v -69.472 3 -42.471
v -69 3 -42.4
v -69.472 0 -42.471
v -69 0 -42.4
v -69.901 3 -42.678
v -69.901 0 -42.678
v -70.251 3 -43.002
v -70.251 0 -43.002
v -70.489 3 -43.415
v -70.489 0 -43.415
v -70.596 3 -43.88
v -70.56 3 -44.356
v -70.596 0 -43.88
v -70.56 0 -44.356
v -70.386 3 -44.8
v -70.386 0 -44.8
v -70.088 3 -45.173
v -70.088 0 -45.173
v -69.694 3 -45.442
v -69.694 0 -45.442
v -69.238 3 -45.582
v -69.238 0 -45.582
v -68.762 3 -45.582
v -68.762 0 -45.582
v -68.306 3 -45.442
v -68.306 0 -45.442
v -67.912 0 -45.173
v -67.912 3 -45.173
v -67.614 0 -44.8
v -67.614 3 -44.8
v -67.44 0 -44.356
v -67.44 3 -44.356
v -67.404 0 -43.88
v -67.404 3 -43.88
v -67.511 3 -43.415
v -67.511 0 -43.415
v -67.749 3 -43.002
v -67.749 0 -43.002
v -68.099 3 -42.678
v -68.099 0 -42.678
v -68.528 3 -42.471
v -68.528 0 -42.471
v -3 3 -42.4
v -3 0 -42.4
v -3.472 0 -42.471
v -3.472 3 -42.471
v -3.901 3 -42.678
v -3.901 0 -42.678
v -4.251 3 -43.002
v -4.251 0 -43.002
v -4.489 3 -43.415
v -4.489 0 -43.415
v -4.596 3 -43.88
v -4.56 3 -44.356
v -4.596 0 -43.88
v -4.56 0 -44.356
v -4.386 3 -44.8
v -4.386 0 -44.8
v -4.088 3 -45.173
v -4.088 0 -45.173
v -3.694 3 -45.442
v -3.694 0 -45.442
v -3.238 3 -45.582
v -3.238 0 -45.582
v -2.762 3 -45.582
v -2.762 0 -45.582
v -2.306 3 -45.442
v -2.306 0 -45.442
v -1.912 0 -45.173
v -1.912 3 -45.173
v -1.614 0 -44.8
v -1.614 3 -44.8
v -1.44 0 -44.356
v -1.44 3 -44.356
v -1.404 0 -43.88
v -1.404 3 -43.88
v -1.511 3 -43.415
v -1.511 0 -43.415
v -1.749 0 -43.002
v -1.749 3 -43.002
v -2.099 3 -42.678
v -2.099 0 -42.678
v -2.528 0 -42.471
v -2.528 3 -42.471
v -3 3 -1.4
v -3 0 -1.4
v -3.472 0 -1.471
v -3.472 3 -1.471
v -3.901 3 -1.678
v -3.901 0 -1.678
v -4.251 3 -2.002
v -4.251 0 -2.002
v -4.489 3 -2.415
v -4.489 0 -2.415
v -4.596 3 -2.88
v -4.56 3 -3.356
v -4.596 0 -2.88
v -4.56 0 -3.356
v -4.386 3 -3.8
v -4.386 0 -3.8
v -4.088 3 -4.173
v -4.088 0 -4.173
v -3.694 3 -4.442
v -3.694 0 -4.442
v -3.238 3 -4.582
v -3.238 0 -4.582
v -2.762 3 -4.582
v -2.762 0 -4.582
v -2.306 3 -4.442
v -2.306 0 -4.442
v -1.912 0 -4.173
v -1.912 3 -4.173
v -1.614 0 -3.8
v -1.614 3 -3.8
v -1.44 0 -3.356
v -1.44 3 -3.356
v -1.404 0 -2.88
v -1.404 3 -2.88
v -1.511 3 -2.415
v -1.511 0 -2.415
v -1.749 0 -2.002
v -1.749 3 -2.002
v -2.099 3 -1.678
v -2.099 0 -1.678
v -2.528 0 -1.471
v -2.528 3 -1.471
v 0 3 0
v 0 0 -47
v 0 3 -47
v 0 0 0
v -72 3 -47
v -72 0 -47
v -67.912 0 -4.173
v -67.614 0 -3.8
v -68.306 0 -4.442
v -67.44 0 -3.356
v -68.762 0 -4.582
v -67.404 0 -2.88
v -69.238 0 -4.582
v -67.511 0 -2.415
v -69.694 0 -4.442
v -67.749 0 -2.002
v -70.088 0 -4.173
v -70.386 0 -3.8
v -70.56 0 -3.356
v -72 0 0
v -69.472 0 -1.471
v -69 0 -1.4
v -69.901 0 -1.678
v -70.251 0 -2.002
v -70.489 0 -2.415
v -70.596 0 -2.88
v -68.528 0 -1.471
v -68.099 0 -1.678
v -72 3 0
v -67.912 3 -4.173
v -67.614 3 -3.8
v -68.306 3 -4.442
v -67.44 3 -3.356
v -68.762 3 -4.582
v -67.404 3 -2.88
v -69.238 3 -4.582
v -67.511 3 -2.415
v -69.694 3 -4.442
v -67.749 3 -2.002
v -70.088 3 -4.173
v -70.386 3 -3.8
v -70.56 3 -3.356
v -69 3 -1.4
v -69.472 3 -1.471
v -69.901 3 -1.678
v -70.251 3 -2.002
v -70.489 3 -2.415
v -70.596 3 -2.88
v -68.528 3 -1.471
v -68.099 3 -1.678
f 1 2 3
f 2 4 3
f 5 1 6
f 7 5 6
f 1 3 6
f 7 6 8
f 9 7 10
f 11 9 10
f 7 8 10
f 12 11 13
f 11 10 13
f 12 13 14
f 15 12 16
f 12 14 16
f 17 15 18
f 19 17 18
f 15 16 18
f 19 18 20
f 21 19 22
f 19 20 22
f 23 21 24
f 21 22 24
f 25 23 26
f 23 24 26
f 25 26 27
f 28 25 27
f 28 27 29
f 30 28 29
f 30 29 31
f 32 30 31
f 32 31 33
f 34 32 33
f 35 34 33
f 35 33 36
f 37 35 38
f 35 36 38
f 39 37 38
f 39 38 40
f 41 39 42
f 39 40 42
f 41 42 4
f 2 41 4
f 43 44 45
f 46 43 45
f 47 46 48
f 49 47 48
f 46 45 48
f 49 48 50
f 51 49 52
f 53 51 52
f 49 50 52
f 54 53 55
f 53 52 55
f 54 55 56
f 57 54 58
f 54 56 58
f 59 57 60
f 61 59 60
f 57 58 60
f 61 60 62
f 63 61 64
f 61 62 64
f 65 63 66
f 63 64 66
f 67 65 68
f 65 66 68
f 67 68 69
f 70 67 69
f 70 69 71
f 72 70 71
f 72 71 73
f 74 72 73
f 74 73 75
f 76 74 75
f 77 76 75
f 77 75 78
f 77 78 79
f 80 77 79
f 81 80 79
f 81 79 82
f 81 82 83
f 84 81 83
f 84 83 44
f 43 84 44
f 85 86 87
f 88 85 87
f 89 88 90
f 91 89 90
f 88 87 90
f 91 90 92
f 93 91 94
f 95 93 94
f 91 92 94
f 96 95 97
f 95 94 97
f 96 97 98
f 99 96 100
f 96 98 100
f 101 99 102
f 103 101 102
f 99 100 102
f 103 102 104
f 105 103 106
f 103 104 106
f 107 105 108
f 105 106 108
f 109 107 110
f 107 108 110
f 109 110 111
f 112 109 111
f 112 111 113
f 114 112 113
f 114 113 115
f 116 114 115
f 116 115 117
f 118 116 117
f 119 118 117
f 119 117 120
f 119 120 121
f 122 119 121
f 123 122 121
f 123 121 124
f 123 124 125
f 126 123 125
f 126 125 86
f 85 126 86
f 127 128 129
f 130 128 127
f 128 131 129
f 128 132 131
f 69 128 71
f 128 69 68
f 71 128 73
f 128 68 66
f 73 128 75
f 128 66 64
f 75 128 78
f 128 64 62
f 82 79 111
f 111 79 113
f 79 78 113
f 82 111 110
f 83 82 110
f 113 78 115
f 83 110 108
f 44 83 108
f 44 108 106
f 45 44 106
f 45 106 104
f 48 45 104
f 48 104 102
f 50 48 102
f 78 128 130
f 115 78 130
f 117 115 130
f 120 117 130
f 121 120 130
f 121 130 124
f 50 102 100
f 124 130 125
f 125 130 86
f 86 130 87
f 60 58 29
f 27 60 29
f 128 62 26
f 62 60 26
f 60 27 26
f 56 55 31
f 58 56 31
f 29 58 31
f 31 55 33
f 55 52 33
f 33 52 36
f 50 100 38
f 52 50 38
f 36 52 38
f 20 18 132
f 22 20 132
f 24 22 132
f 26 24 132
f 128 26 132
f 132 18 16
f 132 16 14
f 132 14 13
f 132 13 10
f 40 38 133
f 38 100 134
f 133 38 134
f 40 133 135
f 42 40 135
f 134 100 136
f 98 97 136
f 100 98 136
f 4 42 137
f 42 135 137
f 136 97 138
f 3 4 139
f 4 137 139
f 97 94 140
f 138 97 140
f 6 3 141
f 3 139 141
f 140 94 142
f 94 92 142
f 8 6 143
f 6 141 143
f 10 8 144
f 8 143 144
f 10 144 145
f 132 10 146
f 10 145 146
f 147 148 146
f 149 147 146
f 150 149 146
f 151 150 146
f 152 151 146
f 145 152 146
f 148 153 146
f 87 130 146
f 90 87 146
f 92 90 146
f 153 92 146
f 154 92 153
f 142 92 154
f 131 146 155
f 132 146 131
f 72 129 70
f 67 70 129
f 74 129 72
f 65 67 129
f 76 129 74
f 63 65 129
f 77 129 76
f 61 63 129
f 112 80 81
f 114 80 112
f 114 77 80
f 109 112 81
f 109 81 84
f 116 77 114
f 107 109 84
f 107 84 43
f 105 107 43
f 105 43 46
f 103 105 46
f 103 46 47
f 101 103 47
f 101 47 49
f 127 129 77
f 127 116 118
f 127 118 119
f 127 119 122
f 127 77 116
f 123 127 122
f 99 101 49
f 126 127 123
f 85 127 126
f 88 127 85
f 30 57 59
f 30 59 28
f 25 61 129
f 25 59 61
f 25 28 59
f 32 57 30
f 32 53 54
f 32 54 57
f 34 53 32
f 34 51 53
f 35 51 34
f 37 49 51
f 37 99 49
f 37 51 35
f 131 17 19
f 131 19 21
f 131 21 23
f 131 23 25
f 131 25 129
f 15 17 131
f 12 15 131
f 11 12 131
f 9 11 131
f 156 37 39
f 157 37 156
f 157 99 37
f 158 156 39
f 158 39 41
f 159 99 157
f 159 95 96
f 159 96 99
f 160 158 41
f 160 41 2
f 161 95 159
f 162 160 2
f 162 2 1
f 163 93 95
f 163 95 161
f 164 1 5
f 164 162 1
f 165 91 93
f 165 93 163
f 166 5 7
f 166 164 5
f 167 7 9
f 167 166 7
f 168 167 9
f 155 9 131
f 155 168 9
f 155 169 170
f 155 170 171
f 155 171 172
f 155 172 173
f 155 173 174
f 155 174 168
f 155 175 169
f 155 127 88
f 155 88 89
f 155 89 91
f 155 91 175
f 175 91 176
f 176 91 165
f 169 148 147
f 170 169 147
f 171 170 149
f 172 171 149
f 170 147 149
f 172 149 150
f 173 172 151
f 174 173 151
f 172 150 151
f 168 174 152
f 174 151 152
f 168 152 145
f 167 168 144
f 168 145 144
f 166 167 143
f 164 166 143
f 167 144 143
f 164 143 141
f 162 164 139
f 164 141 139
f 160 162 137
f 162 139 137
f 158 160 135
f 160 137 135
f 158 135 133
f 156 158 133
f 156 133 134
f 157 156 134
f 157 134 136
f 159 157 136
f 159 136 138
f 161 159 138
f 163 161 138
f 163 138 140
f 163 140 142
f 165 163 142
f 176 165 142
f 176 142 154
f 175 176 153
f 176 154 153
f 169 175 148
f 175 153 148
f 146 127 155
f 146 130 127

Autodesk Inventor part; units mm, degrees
ref_plane "YZ Plane" through (0, 0, 0) normal (1, 0, 0) x (0, 1, 0)
ref_plane "XZ Plane" through (0, 0, 0) normal (0, 1, 0) x (-1, 0, 0)
ref_plane "XY Plane" through (0, 0, 0) normal (0, 0, 1) x (1, 0, 0)
sketch "スケッチ1" plane through (0, 0, 0) normal (0, 1, 0) x (-1, 0, 0)
  line L0 (0, 0) -> (72, 0)
  line L1 (72, 0) -> (72, -47)
  line L2 (72, -47) -> (0, -47)
  line L3 (0, -47) -> (0, 0)
  dimension "d0" = 72
  dimension "d1" = 47
extrude "押し出し1" add sketch "スケッチ1" along normal blind 3
sketch "スケッチ2" plane through (0, 3, 0) normal (0, 1, 0) x (1, 0, 0)
  line L0 (-72, 47) -> (-72, 0) projected
  line L1 (0, 47) -> (-72, 47) projected
  line L2 (-72, 0) -> (0, 0) projected
  line L3 (0, 0) -> (0, 47) projected
  point P0 (-69, 3)
  point P1 (-69, 44)
  point P2 (-3, 3)
  point P3 (-3, 44)
  dimension "d4" = 3
  dimension "d5" = 3
  dimension "d6" = 3
  dimension "d7" = 3
  dimension "d15" = 41
  dimension "d16" = 66
hole "穴1" at (-69, 3, -3) at (-69, 3, -44) at (-3, 3, -3) at (-3, 3, -44) direction (0, -1, 0) diameter 3.2 depth 3
properties part number "mainBoard" material "エポキシ樹脂"
